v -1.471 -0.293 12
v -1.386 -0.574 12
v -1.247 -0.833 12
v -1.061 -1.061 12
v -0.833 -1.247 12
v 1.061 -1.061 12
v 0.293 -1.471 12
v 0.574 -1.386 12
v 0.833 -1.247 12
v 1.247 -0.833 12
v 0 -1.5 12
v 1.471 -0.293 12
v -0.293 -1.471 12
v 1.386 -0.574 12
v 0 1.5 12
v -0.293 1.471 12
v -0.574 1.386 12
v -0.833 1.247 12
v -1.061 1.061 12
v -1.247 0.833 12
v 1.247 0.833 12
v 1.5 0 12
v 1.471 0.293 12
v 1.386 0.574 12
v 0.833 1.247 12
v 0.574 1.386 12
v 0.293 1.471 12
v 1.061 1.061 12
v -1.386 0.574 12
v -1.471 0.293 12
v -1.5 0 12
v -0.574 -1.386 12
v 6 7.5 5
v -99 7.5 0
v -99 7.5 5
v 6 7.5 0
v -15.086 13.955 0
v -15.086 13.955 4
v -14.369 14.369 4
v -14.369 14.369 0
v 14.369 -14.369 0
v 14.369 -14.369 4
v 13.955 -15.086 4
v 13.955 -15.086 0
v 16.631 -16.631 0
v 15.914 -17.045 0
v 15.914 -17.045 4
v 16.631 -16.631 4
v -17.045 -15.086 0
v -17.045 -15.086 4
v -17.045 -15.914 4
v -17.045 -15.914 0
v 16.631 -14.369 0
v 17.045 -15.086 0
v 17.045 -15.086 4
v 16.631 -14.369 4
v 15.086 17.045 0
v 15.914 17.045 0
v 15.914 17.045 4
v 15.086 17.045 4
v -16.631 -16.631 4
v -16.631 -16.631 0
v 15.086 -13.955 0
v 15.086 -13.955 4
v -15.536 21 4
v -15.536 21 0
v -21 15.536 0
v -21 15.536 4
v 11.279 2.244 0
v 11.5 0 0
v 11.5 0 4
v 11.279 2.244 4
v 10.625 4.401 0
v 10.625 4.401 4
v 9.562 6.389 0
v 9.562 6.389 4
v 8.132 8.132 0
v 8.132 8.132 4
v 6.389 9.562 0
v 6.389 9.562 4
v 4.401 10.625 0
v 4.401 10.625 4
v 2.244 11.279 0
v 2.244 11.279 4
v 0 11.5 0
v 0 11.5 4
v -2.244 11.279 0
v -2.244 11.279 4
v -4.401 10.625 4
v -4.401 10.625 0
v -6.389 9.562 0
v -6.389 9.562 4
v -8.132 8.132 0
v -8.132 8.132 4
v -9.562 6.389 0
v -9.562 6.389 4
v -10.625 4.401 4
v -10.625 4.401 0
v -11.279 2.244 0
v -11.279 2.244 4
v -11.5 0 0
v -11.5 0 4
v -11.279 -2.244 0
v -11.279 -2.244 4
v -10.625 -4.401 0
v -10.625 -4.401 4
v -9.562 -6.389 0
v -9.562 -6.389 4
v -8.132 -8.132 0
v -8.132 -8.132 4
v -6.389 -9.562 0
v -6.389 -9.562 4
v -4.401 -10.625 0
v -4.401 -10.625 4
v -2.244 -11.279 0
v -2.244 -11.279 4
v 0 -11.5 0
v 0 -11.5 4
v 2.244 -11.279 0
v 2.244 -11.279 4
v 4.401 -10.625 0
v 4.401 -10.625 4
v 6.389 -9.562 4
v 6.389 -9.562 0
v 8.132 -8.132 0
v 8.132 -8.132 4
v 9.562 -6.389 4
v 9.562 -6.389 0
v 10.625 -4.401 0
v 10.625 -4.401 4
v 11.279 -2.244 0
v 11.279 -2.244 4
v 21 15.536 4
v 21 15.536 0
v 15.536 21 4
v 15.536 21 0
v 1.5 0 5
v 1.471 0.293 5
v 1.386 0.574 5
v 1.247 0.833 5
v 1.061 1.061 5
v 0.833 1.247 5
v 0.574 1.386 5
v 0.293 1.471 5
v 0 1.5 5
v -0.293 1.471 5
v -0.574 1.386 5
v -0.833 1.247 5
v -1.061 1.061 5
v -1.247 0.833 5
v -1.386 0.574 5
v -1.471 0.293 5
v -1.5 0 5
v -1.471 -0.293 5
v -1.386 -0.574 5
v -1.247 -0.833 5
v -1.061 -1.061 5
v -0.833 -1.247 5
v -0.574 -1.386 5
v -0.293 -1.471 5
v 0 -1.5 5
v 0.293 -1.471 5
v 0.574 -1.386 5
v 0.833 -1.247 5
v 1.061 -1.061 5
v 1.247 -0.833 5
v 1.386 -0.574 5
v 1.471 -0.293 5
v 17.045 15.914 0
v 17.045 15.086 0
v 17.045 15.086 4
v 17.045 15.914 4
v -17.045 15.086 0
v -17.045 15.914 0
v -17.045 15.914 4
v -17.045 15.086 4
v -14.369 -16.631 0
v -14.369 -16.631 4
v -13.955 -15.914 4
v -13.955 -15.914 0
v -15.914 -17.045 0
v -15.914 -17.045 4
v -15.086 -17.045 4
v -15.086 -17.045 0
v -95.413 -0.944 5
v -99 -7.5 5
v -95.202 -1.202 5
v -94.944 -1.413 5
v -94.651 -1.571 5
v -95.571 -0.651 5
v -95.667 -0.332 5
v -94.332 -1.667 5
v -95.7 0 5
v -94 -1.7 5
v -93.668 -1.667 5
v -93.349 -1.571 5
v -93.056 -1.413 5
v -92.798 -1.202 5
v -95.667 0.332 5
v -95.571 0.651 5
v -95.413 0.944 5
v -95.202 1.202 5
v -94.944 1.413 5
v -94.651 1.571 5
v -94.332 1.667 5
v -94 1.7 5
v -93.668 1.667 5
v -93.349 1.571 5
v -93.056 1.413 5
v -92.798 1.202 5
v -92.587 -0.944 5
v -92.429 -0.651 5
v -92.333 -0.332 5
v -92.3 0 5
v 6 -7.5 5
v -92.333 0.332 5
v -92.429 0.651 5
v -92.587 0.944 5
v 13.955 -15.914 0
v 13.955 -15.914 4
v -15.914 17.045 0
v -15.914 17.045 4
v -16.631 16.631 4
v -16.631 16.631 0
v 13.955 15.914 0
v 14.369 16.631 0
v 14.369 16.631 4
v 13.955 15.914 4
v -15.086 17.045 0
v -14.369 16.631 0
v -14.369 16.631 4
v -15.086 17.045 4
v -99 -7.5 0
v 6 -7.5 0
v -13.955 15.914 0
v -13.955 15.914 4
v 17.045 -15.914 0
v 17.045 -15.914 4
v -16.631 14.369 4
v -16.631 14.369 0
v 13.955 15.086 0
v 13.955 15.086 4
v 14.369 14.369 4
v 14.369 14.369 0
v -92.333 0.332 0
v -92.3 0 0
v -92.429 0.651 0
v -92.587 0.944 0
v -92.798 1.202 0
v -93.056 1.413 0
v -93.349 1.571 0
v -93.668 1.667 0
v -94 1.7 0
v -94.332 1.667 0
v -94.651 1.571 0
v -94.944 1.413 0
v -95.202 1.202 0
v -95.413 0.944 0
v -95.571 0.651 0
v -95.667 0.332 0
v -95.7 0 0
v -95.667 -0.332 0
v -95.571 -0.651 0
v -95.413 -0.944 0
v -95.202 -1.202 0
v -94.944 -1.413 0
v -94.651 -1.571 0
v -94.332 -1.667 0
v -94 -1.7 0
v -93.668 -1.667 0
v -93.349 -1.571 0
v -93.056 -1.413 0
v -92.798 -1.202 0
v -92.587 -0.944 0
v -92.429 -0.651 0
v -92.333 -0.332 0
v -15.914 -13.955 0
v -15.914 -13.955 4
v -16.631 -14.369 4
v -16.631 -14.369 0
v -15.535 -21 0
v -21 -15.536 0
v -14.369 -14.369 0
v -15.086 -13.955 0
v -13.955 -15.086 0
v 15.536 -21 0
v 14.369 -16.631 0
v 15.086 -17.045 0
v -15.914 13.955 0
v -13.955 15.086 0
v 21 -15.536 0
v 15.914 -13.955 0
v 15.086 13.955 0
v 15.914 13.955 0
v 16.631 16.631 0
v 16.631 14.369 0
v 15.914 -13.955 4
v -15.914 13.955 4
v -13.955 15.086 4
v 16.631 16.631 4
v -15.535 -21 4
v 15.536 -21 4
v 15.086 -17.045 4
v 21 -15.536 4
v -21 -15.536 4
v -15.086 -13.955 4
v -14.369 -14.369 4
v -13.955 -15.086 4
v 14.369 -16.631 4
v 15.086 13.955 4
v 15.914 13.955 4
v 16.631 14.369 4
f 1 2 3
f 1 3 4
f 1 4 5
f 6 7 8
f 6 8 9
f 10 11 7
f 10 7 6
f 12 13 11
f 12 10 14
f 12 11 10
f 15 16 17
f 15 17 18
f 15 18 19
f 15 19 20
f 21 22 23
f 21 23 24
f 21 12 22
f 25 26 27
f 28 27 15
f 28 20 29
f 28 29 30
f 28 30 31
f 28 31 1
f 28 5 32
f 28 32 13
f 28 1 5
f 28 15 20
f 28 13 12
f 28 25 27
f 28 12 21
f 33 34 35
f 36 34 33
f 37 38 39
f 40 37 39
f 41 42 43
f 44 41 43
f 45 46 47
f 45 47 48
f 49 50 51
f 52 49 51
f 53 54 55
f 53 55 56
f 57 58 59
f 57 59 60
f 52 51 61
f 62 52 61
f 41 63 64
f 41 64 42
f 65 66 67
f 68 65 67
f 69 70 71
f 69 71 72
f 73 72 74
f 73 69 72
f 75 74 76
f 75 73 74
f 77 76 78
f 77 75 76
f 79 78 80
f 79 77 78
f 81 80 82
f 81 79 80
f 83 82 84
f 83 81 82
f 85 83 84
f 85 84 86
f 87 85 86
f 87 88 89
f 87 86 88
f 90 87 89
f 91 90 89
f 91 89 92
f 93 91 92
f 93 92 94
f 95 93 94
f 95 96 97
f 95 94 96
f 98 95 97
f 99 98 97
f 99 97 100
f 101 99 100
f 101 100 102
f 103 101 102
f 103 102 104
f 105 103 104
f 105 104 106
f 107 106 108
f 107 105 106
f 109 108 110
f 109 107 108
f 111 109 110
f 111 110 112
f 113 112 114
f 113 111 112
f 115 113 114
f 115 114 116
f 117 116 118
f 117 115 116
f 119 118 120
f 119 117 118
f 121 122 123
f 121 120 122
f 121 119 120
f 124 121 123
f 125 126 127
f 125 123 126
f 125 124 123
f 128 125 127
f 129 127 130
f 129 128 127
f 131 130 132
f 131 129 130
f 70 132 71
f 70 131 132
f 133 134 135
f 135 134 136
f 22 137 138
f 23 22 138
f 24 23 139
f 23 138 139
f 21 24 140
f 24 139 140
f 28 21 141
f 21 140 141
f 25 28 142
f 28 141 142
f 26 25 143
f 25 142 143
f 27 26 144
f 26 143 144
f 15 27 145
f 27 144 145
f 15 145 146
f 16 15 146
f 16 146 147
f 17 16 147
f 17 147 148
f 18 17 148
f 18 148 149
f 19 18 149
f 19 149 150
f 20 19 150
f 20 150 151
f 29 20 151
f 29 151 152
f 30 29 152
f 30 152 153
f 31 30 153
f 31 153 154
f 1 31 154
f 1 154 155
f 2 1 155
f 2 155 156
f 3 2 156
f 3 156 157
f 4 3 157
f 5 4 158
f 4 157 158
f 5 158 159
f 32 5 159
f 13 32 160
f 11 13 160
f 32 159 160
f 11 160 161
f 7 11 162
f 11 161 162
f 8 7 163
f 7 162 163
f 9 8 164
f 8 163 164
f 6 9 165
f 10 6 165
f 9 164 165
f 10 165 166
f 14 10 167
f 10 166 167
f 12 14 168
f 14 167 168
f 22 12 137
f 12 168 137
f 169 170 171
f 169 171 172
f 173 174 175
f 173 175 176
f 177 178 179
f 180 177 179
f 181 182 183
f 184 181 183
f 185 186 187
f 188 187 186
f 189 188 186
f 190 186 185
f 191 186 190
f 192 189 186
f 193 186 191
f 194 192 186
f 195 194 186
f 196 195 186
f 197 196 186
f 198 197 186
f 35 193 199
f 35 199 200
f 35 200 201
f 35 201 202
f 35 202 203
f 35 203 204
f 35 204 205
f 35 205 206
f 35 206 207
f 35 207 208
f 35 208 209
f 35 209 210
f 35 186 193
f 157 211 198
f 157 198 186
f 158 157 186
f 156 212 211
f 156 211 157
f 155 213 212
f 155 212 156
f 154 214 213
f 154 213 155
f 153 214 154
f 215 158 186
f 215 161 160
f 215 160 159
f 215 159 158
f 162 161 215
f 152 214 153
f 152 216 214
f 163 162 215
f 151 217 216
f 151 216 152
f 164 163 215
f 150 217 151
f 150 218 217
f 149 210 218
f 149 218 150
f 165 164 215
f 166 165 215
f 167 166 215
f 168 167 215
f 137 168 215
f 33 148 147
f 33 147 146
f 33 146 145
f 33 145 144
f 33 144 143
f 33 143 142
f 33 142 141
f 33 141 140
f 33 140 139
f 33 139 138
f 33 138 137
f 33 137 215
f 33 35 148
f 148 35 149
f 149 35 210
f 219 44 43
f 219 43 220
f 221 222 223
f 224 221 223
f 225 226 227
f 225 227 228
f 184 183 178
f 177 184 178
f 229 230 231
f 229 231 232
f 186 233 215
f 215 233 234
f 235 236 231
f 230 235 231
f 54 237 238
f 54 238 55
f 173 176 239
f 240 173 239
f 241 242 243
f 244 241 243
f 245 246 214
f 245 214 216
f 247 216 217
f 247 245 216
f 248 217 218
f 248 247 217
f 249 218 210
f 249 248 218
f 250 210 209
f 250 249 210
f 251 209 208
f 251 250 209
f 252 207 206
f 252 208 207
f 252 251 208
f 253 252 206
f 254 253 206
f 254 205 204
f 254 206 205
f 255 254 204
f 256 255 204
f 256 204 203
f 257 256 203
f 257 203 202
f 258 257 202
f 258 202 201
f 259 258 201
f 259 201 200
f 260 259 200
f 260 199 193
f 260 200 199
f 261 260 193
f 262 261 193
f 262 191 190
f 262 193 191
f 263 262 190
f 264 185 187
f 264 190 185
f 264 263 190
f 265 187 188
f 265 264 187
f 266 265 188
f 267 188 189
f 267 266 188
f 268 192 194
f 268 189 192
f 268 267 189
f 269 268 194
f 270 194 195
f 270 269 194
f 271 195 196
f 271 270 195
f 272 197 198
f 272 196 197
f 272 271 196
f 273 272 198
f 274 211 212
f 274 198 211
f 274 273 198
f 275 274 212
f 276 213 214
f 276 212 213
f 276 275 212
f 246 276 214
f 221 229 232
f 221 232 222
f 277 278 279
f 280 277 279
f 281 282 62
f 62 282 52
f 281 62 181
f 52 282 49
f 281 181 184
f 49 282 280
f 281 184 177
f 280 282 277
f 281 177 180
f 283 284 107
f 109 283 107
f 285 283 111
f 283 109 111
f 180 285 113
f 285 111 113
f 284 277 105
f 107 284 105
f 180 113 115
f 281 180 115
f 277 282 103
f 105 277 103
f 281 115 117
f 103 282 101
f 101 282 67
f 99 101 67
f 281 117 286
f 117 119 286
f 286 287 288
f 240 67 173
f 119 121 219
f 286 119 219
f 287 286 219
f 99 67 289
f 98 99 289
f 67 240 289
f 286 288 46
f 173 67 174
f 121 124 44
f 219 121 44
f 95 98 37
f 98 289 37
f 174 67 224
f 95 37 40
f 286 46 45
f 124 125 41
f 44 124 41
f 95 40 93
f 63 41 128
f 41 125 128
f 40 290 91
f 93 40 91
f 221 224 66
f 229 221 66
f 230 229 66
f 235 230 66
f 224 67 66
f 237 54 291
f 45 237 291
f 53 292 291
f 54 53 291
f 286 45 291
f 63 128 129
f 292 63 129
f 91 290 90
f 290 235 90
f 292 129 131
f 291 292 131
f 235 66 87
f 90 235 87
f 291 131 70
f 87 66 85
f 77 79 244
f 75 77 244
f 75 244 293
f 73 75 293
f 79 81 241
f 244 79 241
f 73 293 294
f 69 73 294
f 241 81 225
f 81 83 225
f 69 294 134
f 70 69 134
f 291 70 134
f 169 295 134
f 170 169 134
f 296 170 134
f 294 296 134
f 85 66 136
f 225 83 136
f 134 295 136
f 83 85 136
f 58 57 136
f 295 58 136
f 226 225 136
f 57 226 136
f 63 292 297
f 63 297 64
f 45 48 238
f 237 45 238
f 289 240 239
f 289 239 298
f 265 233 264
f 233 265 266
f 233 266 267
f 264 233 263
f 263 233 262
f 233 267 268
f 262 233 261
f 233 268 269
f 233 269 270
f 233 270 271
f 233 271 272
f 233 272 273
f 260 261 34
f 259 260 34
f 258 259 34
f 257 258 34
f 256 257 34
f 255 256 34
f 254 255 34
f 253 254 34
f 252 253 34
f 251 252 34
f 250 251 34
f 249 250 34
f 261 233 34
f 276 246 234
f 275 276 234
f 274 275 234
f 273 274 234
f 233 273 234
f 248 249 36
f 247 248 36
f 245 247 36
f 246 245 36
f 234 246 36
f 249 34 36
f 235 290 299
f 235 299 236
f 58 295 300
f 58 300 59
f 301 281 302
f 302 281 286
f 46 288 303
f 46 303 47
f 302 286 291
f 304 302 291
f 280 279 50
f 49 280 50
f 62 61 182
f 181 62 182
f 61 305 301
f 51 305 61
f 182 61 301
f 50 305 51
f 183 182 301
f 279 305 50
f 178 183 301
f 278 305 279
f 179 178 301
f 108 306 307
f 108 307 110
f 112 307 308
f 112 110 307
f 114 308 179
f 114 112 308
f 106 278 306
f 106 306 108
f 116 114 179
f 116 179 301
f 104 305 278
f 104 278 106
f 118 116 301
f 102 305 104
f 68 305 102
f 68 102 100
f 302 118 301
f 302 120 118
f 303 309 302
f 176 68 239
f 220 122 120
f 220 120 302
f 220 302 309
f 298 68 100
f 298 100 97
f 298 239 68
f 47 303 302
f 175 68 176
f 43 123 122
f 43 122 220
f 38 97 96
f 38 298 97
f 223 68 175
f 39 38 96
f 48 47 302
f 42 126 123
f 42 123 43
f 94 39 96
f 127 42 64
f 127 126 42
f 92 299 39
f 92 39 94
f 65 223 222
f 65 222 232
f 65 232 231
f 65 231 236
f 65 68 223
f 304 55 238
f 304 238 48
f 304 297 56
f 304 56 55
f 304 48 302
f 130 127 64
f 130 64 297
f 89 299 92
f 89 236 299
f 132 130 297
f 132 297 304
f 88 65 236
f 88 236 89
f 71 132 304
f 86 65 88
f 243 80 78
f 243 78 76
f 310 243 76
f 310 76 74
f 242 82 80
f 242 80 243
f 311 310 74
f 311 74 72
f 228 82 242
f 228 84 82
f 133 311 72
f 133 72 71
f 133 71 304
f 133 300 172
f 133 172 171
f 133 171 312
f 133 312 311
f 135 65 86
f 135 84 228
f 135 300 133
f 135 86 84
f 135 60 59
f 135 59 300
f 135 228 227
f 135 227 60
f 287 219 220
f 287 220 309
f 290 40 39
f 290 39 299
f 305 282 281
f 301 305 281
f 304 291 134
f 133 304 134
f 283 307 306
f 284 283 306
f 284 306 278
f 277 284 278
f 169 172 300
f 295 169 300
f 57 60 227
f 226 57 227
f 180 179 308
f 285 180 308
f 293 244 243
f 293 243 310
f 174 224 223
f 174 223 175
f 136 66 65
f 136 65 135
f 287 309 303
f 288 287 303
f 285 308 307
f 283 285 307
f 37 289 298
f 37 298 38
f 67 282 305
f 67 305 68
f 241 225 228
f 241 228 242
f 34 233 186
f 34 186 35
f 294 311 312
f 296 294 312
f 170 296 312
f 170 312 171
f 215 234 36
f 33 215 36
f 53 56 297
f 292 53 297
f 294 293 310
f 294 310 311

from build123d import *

# Parameters (mm, degrees)
CYLINDER_R               = 11.5
CYLINDER_DEPTH           = 8.8
PRISM001_DEPTH           = 16
CUBE002_W                = 5
CUBE002_H                = 10
CUBE002_DEPTH            = 4.2
UNION001_PLACEMENT_ANGLE = 135
PRISM002_DEPTH           = 16
CUBE003_W                = 5
CUBE003_H                = 10
CUBE003_DEPTH            = 4.2
UNION002_PLACEMENT_ANGLE = 225.000007
PRISM003_DEPTH           = 16
CUBE004_W                = 5
CUBE004_H                = 10
CUBE004_DEPTH            = 4.2
UNION003_PLACEMENT_ANGLE = -45
PRISM_DEPTH              = 16
CUBE001_W                = 5
CUBE001_H                = 10
CUBE001_DEPTH            = 4.2
UNION_PLACEMENT_ANGLE    = 45
CUBE_W                   = 42
CUBE_H                   = 42
CUBE_DEPTH               = 4
CYLINDER001_R            = 1.5
CYLINDER001_DEPTH        = 10
CYLINDER_R_2             = 1.7
CYLINDER_DEPTH_2         = 10
BOX_W                    = 105
BOX_H                    = 15
BOX_DEPTH                = 5


with BuildPart() as cylinder:
    # cylinder → cylinder (new body)
    with BuildSketch(Plane.XY.offset(-4.4)):
        Circle(CYLINDER_R)
    extrude(amount=CYLINDER_DEPTH)


with BuildPart() as prism001:
    # prism001 → prism001 (new body)
    with BuildSketch(Plane(origin=(21.9203, 0, -8), x_dir=(1, 0, 0), z_dir=(0, 0, 1))):
        Polygon((1.6, 0), (1.385641, 0.8), (0.8, 1.385641), (0, 1.6), (-0.8, 1.385641), (-1.385641, 0.8), (-1.6, 0), (-1.385641, -0.8), (-0.8, -1.385641), (0, -1.6), (0.8, -1.385641), (1.385641, -0.8), align=None)
    extrude(amount=PRISM001_DEPTH)


with BuildPart() as union001:
    # cube002 → cube002 (new body)
    with BuildSketch(Plane(origin=(25.8345, -5, -0.1), x_dir=(1, 0, 0), z_dir=(0, 0, 1))):
        with Locations((2.5, 5)):
            Rectangle(CUBE002_W, CUBE002_H)
    extrude(amount=CUBE002_DEPTH)

    # union001: union prism001
    add(prism001.part)


with BuildPart() as union001_1:
    # union001 placement: moved
    add(union001.part.rotate(Axis((0, 0, 0), (0, 0, 1)), UNION001_PLACEMENT_ANGLE))


with BuildPart() as prism002:
    # prism002 → prism002 (new body)
    with BuildSketch(Plane(origin=(21.9203, 0, -8), x_dir=(1, 0, 0), z_dir=(0, 0, 1))):
        Polygon((1.6, 0), (1.385641, 0.8), (0.8, 1.385641), (0, 1.6), (-0.8, 1.385641), (-1.385641, 0.8), (-1.6, 0), (-1.385641, -0.8), (-0.8, -1.385641), (0, -1.6), (0.8, -1.385641), (1.385641, -0.8), align=None)
    extrude(amount=PRISM002_DEPTH)


with BuildPart() as union002:
    # cube003 → cube003 (new body)
    with BuildSketch(Plane(origin=(25.8345, -5, -0.1), x_dir=(1, 0, 0), z_dir=(0, 0, 1))):
        with Locations((2.5, 5)):
            Rectangle(CUBE003_W, CUBE003_H)
    extrude(amount=CUBE003_DEPTH)

    # union002: union prism002
    add(prism002.part)


with BuildPart() as union002_1:
    # union002 placement: moved
    add(union002.part.rotate(Axis((0, 0, 0), (0, 0, 1)), UNION002_PLACEMENT_ANGLE))


with BuildPart() as prism003:
    # prism003 → prism003 (new body)
    with BuildSketch(Plane(origin=(21.9203, 0, -8), x_dir=(1, 0, 0), z_dir=(0, 0, 1))):
        Polygon((1.6, 0), (1.385641, 0.8), (0.8, 1.385641), (0, 1.6), (-0.8, 1.385641), (-1.385641, 0.8), (-1.6, 0), (-1.385641, -0.8), (-0.8, -1.385641), (0, -1.6), (0.8, -1.385641), (1.385641, -0.8), align=None)
    extrude(amount=PRISM003_DEPTH)


with BuildPart() as union003:
    # cube004 → cube004 (new body)
    with BuildSketch(Plane(origin=(25.8345, -5, -0.1), x_dir=(1, 0, 0), z_dir=(0, 0, 1))):
        with Locations((2.5, 5)):
            Rectangle(CUBE004_W, CUBE004_H)
    extrude(amount=CUBE004_DEPTH)

    # union003: union prism003
    add(prism003.part)


with BuildPart() as union003_1:
    # union003 placement: moved
    add(union003.part.rotate(Axis((0, 0, 0), (0, 0, 1)), UNION003_PLACEMENT_ANGLE))


with BuildPart() as prism:
    # prism → prism (new body)
    with BuildSketch(Plane(origin=(21.9203, 0, -8), x_dir=(1, 0, 0), z_dir=(0, 0, 1))):
        Polygon((1.6, 0), (1.385641, 0.8), (0.8, 1.385641), (0, 1.6), (-0.8, 1.385641), (-1.385641, 0.8), (-1.6, 0), (-1.385641, -0.8), (-0.8, -1.385641), (0, -1.6), (0.8, -1.385641), (1.385641, -0.8), align=None)
    extrude(amount=PRISM_DEPTH)


with BuildPart() as union004:
    # cube001 → cube001 (new body)
    with BuildSketch(Plane(origin=(25.8345, -5, -0.1), x_dir=(1, 0, 0), z_dir=(0, 0, 1))):
        with Locations((2.5, 5)):
            Rectangle(CUBE001_W, CUBE001_H)
    extrude(amount=CUBE001_DEPTH)

    # union: union prism
    add(prism.part)


with BuildPart() as union004_1:
    # union placement: moved
    add(union004.part.rotate(Axis((0, 0, 0), (0, 0, 1)), UNION_PLACEMENT_ANGLE))

    # Group: union union001, union002, union003
    add(union001_1.part)
    add(union002_1.part)
    add(union003_1.part)

    # union004: union cylinder
    add(cylinder.part)


with BuildPart() as difference:
    # cube → cube (new body)
    with BuildSketch(Plane(origin=(-21, -21, 0), x_dir=(1, 0, 0), z_dir=(0, 0, 1))):
        with Locations((21, 21)):
            Rectangle(CUBE_W, CUBE_H)
    extrude(amount=CUBE_DEPTH)

    # difference: cut union004
    add(union004_1.part, mode=Mode.SUBTRACT)


with BuildPart() as cylinder001:
    # Cylinder001 → Cylinder001 (new body)
    with BuildSketch(Plane.XY.offset(2)):
        Circle(CYLINDER001_R)
    extrude(amount=CYLINDER001_DEPTH)


with BuildPart() as cylinder_body:
    # Cylinder → Cylinder (new body)
    with BuildSketch(Plane(origin=(-94, 0, -4), x_dir=(1, 0, 0), z_dir=(0, 0, 1))):
        Circle(CYLINDER_R_2)
    extrude(amount=CYLINDER_DEPTH_2)


with BuildPart() as fusion:
    # Box → Box (new body)
    with BuildSketch(Plane(origin=(-99, -7.5, 0), x_dir=(1, 0, 0), z_dir=(0, 0, 1))):
        with Locations((52.5, 7.5)):
            Rectangle(BOX_W, BOX_H)
    extrude(amount=BOX_DEPTH)

    # Cut: cut Cylinder body
    add(cylinder_body.part, mode=Mode.SUBTRACT)

    # Fusion: union Cylinder001
    add(cylinder001.part)


solid = Compound([difference.part, fusion.part])
